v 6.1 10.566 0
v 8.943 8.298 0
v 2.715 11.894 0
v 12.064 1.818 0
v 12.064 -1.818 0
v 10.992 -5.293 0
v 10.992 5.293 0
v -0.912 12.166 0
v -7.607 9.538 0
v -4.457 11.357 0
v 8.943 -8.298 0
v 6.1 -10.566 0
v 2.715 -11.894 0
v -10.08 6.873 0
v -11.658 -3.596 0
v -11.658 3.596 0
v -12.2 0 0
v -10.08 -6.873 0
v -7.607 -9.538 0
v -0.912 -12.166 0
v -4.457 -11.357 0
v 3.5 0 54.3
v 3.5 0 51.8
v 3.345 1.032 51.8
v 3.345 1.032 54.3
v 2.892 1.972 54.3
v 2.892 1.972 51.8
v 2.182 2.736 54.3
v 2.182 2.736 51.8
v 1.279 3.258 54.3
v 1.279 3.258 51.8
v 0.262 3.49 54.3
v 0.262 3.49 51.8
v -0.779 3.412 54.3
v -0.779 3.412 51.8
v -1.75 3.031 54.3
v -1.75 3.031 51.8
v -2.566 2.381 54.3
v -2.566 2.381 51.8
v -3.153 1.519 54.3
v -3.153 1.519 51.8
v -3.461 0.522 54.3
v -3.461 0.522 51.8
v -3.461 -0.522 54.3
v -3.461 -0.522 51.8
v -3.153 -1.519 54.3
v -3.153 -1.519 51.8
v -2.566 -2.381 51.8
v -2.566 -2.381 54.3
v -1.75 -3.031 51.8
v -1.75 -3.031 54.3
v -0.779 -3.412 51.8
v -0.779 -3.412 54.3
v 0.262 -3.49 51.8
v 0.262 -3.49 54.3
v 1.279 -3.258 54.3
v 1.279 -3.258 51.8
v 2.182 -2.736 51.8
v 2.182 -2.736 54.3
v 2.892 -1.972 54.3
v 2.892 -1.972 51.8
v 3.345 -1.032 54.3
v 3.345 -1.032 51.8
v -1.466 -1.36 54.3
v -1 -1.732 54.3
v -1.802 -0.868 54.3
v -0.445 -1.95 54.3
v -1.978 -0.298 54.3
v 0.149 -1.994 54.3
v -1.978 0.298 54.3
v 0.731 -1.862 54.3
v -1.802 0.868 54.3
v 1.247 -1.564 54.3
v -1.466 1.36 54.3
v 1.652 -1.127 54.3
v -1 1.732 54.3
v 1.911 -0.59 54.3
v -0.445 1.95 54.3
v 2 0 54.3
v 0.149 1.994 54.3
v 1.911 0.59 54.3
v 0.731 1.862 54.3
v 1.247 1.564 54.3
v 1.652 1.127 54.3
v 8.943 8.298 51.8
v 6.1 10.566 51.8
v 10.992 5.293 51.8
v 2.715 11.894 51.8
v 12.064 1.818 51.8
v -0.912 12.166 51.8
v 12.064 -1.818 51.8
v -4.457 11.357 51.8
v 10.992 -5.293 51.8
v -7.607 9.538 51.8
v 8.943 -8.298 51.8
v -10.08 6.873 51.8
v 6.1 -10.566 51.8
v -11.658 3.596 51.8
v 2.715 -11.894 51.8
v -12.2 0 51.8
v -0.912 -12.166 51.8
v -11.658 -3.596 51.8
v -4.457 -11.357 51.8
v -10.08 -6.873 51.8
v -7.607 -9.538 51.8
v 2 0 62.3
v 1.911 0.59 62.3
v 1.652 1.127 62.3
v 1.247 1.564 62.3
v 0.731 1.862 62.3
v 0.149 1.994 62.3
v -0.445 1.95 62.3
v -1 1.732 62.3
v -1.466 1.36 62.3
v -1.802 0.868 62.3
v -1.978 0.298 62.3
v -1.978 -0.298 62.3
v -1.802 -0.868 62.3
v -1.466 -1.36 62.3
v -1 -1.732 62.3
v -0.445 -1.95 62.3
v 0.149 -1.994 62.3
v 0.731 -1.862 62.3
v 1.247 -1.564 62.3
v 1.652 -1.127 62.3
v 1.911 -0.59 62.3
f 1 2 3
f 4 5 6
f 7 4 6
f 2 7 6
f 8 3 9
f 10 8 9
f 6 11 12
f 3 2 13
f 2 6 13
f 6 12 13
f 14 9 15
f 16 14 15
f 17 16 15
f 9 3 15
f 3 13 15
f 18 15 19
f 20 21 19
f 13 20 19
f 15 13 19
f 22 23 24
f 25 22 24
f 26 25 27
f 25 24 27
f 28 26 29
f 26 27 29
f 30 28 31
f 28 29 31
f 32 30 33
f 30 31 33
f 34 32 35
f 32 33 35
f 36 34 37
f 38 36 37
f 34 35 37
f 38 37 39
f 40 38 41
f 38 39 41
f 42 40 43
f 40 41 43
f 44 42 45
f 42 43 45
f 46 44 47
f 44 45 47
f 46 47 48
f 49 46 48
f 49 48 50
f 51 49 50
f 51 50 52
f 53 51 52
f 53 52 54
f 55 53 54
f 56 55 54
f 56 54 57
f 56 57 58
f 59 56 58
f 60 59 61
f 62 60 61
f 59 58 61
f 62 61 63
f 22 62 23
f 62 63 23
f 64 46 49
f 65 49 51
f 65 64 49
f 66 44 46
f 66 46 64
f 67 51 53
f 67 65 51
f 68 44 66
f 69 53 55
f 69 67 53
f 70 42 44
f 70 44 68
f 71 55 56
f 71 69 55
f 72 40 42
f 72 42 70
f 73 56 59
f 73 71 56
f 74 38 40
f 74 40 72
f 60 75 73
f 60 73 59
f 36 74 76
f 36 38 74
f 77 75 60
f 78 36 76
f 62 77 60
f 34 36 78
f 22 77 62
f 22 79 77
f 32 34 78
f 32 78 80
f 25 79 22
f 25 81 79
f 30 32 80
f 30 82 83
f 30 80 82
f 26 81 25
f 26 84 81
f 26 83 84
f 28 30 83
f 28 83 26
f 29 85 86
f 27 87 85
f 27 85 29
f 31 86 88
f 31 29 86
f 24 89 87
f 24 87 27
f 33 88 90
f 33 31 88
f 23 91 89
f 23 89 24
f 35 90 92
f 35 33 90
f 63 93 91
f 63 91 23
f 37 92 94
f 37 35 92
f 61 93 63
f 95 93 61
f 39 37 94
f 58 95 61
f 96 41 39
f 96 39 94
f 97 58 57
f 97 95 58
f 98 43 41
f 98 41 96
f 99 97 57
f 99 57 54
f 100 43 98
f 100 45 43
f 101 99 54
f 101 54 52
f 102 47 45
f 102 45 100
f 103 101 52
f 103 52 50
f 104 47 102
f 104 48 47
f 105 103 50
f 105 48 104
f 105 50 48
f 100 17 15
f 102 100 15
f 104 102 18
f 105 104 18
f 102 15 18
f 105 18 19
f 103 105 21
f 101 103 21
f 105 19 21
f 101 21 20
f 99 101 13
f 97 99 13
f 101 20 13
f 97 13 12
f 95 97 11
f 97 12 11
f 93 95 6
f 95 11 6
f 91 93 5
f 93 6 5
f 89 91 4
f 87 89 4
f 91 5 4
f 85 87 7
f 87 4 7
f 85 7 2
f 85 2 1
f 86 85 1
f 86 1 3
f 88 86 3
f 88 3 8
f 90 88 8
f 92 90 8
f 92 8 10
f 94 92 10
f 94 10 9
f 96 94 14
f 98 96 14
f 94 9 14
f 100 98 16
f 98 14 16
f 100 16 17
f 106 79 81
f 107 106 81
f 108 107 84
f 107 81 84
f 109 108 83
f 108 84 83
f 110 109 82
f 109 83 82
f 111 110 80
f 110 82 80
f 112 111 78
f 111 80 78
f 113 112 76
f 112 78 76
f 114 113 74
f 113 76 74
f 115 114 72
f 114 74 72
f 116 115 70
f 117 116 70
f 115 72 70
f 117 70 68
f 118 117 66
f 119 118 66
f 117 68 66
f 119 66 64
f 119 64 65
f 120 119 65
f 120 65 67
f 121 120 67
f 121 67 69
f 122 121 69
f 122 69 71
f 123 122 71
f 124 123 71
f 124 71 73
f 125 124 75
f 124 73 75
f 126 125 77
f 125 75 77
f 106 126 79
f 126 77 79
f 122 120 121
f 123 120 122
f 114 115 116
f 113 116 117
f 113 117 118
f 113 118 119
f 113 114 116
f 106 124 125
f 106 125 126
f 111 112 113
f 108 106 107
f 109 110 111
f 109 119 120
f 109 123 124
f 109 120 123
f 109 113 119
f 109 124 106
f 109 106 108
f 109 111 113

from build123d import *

# Parameters (mm, degrees)
SKETCH_1_R      = 12.2
EXTRUDE_1_DEPTH = 51.8
SKETCH_5_R      = 3.5
EXTRUDE_3_DEPTH = 2.5
SKETCH_6_R      = 2
EXTRUDE_4_DEPTH = 8


with BuildPart() as part:
    # 草图1 → 凸台-拉伸1 (new body)
    with BuildSketch(Plane.XY):
        with Locations(Location((0, 0, 0), (0, 0, 180))):
            Circle(SKETCH_1_R)
    extrude(amount=EXTRUDE_1_DEPTH)

    # 草图5 → 凸台-拉伸3 (add)
    with BuildSketch(Plane.XY.offset(51.8)):
        Circle(SKETCH_5_R)
    extrude(amount=EXTRUDE_3_DEPTH)

    # 草图6 → 凸台-拉伸4 (add)
    with BuildSketch(Plane.XY.offset(54.3)):
        Circle(SKETCH_6_R)
    extrude(amount=EXTRUDE_4_DEPTH)


solid = part.part
